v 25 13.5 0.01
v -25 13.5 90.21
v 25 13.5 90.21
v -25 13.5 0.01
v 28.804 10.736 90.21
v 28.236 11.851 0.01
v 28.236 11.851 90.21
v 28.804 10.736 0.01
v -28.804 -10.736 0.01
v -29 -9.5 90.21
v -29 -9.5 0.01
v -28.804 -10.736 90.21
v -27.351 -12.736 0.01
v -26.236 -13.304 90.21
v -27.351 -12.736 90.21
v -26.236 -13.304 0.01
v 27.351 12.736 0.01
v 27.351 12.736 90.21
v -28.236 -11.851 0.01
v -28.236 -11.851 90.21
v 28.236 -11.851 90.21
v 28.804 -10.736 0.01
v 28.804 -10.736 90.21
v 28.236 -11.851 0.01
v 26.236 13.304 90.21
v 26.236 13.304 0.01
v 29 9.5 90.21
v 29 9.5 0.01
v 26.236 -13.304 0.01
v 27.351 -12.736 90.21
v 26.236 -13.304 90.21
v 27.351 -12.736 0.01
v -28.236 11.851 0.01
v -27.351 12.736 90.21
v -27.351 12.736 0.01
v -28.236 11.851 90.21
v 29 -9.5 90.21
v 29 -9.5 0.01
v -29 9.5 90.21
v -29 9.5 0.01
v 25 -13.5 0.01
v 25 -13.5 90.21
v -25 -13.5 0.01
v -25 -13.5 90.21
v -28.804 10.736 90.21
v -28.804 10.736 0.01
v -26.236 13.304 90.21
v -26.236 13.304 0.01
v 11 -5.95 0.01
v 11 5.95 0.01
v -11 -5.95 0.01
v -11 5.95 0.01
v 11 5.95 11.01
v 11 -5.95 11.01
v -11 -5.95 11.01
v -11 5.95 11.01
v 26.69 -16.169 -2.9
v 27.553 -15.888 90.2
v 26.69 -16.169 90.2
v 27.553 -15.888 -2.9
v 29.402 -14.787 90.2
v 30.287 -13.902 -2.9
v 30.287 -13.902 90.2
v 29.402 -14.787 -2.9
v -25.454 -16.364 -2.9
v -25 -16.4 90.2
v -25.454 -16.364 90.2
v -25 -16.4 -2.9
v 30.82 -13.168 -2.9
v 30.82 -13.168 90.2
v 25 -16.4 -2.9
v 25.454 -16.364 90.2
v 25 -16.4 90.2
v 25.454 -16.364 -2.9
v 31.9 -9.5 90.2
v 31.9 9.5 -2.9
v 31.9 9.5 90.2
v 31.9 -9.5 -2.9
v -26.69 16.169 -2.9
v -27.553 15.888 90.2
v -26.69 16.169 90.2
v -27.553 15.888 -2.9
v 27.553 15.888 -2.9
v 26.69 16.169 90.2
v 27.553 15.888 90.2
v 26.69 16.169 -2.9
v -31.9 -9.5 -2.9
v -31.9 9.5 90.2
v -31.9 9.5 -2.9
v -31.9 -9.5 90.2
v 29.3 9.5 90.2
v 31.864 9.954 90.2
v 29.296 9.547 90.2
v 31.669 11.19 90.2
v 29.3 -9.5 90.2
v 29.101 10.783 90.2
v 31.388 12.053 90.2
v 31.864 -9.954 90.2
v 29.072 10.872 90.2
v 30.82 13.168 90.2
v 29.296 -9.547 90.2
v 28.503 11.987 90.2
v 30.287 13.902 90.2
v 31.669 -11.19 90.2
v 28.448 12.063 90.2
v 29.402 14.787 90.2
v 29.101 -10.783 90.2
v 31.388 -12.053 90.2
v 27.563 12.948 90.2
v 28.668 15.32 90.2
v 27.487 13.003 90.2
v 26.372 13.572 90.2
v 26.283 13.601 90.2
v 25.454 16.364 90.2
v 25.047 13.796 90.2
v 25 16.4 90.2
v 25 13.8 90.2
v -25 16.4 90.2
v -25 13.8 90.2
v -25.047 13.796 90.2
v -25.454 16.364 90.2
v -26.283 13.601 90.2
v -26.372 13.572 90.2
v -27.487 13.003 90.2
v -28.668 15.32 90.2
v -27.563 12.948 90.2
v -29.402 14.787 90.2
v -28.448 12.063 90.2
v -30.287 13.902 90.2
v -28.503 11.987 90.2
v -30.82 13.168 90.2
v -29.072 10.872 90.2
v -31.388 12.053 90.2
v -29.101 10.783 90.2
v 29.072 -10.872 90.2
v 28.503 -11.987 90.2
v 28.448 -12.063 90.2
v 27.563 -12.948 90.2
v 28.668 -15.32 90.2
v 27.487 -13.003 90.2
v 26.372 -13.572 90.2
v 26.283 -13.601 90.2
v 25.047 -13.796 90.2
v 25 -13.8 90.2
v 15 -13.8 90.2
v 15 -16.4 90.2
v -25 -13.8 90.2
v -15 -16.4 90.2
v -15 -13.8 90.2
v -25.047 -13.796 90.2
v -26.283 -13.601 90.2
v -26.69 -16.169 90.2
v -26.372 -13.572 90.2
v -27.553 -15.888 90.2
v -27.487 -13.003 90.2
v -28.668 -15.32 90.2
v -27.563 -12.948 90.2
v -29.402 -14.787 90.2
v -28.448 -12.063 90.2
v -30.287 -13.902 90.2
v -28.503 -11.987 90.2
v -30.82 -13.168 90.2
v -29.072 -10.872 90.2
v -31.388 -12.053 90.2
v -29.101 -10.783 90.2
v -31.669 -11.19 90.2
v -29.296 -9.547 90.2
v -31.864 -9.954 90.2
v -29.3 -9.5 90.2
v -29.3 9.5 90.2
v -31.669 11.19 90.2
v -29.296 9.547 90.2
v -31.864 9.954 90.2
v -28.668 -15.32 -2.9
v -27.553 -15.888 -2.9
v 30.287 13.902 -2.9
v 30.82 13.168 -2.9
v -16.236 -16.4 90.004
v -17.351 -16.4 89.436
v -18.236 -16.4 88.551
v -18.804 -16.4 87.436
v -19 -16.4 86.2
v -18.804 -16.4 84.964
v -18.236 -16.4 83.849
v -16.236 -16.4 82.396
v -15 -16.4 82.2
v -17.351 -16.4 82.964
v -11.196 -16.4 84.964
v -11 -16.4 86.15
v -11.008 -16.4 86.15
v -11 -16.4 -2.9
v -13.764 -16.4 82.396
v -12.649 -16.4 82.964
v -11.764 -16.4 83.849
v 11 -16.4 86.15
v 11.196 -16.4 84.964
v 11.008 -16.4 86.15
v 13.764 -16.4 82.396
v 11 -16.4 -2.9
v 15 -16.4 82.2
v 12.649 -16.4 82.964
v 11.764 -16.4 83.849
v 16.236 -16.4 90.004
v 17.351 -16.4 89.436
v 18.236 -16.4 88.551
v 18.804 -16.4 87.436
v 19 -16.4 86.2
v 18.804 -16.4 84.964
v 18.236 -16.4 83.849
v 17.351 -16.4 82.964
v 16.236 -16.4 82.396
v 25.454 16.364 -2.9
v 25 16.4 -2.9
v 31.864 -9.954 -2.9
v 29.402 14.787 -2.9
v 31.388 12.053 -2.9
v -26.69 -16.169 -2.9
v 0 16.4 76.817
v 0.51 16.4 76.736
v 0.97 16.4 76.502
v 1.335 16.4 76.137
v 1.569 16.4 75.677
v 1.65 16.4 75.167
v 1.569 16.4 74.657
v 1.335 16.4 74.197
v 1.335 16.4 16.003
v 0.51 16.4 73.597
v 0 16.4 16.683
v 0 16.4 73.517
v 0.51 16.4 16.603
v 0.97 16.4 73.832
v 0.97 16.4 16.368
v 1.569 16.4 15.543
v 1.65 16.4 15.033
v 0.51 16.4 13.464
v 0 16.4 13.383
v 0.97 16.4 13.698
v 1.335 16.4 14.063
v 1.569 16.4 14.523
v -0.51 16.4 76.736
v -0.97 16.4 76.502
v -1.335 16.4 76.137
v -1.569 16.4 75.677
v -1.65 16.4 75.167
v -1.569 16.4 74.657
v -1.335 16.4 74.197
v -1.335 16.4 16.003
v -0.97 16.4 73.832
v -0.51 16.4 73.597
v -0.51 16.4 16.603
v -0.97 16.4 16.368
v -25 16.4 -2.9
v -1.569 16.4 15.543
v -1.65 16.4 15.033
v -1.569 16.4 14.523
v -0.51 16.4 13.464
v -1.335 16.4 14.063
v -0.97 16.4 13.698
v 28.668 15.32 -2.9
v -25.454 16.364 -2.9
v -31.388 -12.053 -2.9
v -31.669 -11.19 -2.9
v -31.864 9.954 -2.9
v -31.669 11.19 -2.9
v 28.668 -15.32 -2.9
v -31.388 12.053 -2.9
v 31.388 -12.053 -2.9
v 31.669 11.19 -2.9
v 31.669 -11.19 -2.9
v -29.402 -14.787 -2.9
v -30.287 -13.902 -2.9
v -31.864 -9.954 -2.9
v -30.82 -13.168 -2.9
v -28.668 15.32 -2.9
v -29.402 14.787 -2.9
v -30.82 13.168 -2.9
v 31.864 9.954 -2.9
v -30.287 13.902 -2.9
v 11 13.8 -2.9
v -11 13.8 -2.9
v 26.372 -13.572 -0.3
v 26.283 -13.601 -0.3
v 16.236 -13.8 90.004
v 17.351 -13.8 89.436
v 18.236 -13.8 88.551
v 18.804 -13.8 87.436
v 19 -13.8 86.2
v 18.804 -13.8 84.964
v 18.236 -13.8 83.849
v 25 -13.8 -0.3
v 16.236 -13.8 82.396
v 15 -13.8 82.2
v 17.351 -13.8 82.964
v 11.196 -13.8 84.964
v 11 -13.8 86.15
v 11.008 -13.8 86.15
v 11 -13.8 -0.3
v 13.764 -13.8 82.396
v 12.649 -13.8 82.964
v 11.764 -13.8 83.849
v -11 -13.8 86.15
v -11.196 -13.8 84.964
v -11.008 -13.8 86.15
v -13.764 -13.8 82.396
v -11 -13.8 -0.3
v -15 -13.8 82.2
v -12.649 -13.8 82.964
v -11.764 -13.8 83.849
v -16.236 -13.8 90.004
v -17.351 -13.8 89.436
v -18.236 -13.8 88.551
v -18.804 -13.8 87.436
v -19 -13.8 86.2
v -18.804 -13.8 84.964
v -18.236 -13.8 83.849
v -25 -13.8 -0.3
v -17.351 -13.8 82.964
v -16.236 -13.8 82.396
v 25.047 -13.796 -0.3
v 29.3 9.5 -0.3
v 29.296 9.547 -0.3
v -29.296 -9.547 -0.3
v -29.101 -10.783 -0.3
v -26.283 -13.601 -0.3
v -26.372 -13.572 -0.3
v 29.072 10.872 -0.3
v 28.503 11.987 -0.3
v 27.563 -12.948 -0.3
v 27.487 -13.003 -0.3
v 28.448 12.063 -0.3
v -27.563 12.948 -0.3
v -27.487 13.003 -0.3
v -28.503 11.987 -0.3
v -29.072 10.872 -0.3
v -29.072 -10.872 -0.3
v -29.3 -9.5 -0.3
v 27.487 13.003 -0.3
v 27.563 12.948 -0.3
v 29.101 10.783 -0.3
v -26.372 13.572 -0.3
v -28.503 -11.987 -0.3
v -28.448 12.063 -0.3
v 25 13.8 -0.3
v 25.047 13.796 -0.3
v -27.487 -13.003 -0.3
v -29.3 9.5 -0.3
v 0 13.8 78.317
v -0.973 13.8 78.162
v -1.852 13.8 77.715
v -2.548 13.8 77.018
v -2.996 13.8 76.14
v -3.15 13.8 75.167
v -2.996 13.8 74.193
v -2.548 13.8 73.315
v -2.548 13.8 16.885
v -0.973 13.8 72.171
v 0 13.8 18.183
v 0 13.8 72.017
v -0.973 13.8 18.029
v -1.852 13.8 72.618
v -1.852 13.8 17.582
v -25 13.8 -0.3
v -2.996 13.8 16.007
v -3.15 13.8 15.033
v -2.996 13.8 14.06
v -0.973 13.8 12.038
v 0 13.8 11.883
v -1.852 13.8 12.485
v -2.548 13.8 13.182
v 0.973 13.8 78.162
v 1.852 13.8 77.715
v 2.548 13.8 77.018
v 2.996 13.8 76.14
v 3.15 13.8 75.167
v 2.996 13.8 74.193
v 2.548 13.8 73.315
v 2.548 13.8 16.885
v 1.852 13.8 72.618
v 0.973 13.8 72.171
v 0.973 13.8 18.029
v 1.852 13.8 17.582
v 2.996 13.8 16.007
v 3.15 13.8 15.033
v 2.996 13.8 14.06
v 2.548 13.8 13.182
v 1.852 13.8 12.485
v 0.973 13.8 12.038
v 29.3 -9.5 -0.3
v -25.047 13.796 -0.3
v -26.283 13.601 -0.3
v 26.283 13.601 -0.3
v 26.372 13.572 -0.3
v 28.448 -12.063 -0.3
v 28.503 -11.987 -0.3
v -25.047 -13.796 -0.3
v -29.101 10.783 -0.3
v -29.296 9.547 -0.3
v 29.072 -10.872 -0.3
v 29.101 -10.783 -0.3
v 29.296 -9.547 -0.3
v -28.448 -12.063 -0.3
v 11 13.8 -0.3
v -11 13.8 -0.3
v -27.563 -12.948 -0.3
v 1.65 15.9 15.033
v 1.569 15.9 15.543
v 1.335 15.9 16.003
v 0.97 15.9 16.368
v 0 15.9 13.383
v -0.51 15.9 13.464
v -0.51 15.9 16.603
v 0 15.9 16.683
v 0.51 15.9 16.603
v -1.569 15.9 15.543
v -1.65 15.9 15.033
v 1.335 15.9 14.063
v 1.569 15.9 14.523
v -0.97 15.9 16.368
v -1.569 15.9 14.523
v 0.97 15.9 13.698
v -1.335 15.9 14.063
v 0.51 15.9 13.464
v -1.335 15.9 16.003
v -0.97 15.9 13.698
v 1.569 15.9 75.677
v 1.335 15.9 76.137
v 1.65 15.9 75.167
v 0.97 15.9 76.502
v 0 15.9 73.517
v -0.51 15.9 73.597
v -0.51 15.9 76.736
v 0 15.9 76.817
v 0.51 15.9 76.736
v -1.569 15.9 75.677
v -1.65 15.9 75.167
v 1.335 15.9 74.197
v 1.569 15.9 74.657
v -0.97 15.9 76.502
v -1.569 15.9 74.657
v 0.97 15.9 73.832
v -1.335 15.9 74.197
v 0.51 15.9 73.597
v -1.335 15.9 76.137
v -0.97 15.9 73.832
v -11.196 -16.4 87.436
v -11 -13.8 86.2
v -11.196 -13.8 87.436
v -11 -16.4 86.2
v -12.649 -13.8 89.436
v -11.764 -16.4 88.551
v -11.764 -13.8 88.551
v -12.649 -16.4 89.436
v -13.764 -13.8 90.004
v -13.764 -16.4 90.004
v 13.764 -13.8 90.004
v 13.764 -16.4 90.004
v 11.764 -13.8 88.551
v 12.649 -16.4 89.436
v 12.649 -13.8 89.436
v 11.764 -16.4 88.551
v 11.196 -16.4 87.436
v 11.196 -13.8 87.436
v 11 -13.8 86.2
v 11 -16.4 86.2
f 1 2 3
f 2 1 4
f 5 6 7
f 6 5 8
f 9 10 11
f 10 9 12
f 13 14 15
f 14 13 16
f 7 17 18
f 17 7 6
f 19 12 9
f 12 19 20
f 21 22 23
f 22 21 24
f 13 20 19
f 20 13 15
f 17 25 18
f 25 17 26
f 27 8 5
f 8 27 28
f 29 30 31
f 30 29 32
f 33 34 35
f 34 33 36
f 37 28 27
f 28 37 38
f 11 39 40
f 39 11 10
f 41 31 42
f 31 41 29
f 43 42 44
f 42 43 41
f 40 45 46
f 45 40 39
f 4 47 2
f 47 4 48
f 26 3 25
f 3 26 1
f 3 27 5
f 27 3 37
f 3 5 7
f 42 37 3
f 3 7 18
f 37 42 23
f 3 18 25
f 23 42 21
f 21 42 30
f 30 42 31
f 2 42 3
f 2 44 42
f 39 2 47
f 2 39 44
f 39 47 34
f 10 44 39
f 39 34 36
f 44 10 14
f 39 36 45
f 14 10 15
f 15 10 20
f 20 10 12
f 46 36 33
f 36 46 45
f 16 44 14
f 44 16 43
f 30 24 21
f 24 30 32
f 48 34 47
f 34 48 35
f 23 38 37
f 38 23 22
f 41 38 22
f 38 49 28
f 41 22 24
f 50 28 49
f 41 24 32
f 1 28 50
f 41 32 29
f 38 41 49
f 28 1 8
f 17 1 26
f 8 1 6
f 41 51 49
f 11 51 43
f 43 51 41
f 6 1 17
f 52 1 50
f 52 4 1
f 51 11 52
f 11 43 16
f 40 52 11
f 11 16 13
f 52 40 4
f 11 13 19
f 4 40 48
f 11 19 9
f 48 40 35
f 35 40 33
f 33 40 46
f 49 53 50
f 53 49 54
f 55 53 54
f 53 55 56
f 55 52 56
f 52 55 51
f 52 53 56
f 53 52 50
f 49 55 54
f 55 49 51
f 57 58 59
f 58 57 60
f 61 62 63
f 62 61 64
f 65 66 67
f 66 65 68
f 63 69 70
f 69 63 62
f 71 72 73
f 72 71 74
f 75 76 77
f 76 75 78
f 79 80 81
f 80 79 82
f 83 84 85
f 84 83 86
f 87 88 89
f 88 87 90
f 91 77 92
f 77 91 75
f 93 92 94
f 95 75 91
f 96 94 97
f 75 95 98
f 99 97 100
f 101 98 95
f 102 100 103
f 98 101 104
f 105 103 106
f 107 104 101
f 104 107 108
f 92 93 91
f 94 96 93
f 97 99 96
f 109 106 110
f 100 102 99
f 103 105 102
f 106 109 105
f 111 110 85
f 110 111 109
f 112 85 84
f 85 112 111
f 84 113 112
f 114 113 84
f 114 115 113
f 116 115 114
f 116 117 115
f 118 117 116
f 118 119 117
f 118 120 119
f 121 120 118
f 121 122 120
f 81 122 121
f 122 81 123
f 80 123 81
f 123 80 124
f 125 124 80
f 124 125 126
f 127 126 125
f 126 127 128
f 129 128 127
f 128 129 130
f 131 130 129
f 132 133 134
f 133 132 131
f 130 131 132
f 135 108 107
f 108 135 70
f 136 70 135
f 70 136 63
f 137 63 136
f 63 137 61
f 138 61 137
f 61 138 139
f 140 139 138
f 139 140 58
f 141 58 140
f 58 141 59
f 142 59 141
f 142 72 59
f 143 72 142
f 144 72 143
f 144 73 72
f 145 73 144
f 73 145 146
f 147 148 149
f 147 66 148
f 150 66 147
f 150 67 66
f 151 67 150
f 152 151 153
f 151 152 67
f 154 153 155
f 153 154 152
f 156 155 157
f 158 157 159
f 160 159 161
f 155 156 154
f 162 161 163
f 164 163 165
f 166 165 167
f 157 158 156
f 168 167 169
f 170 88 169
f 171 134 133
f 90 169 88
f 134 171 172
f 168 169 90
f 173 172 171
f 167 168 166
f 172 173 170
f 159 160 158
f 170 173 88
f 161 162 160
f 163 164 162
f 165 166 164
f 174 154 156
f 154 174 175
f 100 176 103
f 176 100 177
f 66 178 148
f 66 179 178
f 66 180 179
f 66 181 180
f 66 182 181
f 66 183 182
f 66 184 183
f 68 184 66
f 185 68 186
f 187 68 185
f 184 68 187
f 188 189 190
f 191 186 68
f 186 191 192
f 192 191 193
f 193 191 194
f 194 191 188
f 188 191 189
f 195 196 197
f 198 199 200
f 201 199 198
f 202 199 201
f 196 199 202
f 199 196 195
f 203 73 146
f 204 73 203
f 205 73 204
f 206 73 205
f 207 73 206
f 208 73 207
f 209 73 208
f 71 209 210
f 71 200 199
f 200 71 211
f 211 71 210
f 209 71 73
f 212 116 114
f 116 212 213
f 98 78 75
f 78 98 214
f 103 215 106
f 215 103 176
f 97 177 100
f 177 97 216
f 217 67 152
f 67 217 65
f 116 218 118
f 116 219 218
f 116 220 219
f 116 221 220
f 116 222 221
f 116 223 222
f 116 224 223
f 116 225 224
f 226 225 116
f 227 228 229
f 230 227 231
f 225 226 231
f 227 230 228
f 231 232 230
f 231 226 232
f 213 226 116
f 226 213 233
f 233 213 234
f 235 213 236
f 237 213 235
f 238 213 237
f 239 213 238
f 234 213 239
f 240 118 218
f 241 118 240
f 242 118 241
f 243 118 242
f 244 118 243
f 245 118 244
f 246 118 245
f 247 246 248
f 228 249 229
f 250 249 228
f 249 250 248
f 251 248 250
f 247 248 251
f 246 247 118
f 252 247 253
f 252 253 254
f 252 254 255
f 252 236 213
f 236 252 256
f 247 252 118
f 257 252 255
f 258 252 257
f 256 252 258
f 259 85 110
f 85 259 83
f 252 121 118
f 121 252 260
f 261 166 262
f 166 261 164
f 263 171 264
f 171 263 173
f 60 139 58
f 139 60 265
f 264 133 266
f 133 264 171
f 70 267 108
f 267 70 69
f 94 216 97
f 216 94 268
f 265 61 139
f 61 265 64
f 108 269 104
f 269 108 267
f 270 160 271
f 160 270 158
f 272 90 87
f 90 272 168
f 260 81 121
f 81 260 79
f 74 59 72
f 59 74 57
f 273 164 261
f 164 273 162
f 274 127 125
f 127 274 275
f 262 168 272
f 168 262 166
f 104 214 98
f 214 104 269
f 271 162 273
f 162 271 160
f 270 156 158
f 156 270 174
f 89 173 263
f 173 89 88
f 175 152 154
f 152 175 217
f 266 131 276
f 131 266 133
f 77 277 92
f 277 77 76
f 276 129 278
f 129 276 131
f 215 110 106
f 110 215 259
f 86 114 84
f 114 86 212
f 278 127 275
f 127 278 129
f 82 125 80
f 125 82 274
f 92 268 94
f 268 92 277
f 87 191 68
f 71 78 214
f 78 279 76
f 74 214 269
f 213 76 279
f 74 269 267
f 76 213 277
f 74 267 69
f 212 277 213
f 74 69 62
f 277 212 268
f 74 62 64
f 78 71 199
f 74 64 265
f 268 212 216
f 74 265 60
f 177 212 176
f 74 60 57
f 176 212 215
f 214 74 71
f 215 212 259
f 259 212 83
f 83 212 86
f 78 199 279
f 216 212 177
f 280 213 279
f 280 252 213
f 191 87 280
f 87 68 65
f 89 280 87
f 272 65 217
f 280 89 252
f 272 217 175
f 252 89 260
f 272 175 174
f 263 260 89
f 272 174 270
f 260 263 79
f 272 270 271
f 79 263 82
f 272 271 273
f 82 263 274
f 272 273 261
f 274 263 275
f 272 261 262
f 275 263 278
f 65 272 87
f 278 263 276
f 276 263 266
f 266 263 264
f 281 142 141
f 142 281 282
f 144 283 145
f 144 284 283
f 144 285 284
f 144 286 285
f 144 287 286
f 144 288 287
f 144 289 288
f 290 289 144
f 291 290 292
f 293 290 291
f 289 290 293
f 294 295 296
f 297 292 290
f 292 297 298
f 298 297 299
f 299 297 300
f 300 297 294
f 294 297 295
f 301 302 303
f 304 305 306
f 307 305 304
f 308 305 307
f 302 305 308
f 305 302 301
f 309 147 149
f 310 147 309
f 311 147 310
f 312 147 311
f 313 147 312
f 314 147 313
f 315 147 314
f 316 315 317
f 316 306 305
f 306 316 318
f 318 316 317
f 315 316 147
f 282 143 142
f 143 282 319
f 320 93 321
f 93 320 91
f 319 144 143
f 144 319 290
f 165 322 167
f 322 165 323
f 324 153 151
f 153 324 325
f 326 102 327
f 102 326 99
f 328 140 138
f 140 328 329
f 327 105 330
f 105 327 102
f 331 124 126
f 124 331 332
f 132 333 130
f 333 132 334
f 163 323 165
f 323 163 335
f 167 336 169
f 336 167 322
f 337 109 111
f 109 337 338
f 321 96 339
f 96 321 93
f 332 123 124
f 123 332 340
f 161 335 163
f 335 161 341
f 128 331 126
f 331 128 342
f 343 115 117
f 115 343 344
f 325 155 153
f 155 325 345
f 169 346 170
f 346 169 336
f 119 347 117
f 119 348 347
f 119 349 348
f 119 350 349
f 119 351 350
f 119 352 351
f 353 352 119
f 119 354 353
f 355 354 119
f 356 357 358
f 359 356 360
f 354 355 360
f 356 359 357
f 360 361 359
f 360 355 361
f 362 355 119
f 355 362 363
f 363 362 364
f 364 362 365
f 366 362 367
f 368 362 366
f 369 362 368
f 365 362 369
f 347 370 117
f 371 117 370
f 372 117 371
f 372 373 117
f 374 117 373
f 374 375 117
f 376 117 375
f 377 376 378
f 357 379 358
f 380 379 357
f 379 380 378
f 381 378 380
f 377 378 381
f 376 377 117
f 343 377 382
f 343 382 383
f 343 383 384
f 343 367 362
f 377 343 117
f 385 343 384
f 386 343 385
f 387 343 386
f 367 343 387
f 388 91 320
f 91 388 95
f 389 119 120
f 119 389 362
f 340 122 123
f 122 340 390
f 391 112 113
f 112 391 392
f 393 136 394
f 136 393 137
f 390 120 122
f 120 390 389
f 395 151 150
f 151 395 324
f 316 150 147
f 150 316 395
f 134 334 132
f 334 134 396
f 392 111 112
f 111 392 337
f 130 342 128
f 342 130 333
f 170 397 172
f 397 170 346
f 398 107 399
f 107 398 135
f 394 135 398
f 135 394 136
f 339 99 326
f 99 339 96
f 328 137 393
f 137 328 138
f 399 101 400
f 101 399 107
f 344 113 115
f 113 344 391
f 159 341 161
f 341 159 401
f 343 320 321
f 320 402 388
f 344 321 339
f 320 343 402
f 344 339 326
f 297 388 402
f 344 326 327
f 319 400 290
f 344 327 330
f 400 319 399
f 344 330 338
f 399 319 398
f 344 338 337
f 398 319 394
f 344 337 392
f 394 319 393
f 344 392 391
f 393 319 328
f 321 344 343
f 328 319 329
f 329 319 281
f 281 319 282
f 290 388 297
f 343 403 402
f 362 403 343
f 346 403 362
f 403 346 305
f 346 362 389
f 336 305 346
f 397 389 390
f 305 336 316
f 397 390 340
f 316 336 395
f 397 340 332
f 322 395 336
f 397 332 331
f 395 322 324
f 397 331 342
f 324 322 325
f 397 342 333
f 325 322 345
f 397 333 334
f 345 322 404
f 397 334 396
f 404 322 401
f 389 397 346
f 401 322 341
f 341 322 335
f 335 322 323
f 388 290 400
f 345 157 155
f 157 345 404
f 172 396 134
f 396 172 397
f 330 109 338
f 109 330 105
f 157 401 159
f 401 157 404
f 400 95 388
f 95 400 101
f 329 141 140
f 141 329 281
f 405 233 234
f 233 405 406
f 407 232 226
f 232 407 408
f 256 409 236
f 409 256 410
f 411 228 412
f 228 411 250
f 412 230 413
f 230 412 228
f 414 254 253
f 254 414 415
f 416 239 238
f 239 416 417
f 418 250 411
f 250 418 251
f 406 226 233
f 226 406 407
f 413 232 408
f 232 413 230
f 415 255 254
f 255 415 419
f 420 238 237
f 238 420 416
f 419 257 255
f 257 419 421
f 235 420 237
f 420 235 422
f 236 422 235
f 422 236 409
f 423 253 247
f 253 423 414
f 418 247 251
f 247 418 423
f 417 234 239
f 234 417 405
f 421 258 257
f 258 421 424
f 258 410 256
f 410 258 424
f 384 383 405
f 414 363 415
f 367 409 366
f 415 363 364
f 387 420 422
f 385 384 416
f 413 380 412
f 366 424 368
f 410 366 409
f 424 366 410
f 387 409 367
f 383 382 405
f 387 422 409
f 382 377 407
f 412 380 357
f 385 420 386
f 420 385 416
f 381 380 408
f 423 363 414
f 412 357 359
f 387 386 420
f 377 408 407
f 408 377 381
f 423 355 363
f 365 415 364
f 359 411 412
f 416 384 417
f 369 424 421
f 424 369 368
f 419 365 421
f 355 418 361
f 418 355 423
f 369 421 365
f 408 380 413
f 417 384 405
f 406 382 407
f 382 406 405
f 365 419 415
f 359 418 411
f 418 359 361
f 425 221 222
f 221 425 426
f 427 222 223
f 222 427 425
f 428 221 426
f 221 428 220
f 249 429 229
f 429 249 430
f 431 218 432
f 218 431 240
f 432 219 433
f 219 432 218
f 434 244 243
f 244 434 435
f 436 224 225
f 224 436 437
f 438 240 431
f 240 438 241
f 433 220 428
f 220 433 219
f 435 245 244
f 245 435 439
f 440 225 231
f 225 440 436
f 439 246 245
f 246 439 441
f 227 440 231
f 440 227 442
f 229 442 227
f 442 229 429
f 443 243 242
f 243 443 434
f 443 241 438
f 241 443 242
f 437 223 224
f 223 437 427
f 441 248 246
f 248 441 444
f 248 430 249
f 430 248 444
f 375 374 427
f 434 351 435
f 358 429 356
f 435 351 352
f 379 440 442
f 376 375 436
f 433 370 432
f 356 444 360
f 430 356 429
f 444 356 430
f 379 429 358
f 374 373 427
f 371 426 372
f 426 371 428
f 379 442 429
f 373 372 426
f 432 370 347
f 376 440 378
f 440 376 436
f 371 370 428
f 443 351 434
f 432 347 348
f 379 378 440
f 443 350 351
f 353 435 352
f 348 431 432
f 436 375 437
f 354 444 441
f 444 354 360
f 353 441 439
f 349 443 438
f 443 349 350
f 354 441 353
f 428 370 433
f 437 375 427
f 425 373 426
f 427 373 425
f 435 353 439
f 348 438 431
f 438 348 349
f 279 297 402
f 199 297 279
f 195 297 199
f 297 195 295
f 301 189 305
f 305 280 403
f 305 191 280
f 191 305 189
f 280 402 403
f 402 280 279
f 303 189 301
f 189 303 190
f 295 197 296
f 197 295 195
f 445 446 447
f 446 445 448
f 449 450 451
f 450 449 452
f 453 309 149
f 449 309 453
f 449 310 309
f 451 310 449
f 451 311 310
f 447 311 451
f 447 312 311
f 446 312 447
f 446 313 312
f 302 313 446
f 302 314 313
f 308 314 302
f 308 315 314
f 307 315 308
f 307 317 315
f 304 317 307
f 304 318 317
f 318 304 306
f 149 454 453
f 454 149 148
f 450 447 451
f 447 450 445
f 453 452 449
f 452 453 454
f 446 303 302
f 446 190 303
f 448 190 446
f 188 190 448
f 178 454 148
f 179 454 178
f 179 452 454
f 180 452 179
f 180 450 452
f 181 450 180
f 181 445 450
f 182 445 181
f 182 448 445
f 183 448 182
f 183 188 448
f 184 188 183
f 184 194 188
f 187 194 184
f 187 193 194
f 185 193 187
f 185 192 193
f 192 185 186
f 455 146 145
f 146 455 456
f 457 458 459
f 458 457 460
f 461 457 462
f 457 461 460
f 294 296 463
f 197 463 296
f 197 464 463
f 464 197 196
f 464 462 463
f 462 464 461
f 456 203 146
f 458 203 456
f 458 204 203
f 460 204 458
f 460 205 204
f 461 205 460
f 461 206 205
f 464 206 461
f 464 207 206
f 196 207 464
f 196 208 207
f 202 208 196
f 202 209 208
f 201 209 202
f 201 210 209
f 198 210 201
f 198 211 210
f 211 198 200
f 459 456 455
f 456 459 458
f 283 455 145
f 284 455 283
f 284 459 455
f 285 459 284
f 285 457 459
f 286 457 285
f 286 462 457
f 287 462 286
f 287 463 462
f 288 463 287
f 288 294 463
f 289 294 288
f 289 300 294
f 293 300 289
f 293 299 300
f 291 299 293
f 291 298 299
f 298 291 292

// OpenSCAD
/* [Dimensions] */
fudge=0.1;
$fn=20;
screwDia=3;
wallThck=2.6;
screwDK=6;
screwK=1.8;
spcng=0.3;

/* [show] */
showDummy=true;
showHolder=true;



ankerPP5();


module ankerPP5(){
  //Anker Power Port 5
  ovDims=[58,27,90.2];
  rad=4;
  
  
  outRad=rad+spcng+wallThck;
  bdyHght=ovDims.z+wallThck+spcng;
  slotDims=[22,ovDims.y+wallThck+spcng*2+fudge,bdyHght+fudge];
  wallYOffset=ovDims.y/2+spcng+wallThck/2;
  if (showDummy) translate([0,0,0.01]) color("ivory") dummy();
    
  if (showHolder){
    difference(){
      body();
      //front and bottom slot
      translate([0,-(wallThck+fudge)/2,-wallThck-spcng+(bdyHght)/2]) 
        cube(slotDims,true);
      translate([0,-wallYOffset,ovDims.z-rad/2]) 
        cube([rad*2+slotDims.x,wallThck+fudge,rad+fudge],true);
      //screw holes
      for (iz=[-1,1])
        translate([0,wallYOffset,ovDims.z/2+iz*ovDims.z/3]){
          rotate([90,0,0]) cylinder(d=screwDia+spcng,h=wallThck+fudge,center=true);
          translate([0,-wallThck/2,0]) rotate([-90,0,0]) screwHd();
        }
    }
    for (ix=[-1,1])
      translate([ix*(slotDims.x/2+rad),-wallYOffset,ovDims.z-rad]) 
        rotate([90,0,0]) cylinder(r=rad,h=wallThck,center=true);
  }
 module body(){ 
  translate([0,0,-wallThck-spcng])  
    difference(){
      linear_extrude(ovDims.z+wallThck+spcng) offset(wallThck+spcng) shape();
      translate([0,0,wallThck]) linear_extrude(ovDims.z+spcng+fudge) 
        offset(spcng) shape();
    }
  }
  
  module dummy(){
    difference(){
      linear_extrude(ovDims.z) shape();
      translate([0,0,(11-fudge)/2]) cube([22,11.9,11+fudge],true);
    }
  }
  
  module shape(){
    hull() for (ix=[-1,1],iy=[-1,1])
        translate([ix*(ovDims.x/2-rad),iy*(ovDims.y/2-rad),0]) circle(r=rad);
  }
}

*coin();
module coin(dia=10, h=3){
  rotate_extrude(){
    translate([(dia-h)/2,0]) circle(d=h);
    translate([0,-h/2]) square([(dia-h)/2,h]);
  }
}

*screwHd();
module screwHd(offset=spcng){
  cylinder(d1=screwDK+offset,d2=screwDia+offset,h=screwK+offset);
}
